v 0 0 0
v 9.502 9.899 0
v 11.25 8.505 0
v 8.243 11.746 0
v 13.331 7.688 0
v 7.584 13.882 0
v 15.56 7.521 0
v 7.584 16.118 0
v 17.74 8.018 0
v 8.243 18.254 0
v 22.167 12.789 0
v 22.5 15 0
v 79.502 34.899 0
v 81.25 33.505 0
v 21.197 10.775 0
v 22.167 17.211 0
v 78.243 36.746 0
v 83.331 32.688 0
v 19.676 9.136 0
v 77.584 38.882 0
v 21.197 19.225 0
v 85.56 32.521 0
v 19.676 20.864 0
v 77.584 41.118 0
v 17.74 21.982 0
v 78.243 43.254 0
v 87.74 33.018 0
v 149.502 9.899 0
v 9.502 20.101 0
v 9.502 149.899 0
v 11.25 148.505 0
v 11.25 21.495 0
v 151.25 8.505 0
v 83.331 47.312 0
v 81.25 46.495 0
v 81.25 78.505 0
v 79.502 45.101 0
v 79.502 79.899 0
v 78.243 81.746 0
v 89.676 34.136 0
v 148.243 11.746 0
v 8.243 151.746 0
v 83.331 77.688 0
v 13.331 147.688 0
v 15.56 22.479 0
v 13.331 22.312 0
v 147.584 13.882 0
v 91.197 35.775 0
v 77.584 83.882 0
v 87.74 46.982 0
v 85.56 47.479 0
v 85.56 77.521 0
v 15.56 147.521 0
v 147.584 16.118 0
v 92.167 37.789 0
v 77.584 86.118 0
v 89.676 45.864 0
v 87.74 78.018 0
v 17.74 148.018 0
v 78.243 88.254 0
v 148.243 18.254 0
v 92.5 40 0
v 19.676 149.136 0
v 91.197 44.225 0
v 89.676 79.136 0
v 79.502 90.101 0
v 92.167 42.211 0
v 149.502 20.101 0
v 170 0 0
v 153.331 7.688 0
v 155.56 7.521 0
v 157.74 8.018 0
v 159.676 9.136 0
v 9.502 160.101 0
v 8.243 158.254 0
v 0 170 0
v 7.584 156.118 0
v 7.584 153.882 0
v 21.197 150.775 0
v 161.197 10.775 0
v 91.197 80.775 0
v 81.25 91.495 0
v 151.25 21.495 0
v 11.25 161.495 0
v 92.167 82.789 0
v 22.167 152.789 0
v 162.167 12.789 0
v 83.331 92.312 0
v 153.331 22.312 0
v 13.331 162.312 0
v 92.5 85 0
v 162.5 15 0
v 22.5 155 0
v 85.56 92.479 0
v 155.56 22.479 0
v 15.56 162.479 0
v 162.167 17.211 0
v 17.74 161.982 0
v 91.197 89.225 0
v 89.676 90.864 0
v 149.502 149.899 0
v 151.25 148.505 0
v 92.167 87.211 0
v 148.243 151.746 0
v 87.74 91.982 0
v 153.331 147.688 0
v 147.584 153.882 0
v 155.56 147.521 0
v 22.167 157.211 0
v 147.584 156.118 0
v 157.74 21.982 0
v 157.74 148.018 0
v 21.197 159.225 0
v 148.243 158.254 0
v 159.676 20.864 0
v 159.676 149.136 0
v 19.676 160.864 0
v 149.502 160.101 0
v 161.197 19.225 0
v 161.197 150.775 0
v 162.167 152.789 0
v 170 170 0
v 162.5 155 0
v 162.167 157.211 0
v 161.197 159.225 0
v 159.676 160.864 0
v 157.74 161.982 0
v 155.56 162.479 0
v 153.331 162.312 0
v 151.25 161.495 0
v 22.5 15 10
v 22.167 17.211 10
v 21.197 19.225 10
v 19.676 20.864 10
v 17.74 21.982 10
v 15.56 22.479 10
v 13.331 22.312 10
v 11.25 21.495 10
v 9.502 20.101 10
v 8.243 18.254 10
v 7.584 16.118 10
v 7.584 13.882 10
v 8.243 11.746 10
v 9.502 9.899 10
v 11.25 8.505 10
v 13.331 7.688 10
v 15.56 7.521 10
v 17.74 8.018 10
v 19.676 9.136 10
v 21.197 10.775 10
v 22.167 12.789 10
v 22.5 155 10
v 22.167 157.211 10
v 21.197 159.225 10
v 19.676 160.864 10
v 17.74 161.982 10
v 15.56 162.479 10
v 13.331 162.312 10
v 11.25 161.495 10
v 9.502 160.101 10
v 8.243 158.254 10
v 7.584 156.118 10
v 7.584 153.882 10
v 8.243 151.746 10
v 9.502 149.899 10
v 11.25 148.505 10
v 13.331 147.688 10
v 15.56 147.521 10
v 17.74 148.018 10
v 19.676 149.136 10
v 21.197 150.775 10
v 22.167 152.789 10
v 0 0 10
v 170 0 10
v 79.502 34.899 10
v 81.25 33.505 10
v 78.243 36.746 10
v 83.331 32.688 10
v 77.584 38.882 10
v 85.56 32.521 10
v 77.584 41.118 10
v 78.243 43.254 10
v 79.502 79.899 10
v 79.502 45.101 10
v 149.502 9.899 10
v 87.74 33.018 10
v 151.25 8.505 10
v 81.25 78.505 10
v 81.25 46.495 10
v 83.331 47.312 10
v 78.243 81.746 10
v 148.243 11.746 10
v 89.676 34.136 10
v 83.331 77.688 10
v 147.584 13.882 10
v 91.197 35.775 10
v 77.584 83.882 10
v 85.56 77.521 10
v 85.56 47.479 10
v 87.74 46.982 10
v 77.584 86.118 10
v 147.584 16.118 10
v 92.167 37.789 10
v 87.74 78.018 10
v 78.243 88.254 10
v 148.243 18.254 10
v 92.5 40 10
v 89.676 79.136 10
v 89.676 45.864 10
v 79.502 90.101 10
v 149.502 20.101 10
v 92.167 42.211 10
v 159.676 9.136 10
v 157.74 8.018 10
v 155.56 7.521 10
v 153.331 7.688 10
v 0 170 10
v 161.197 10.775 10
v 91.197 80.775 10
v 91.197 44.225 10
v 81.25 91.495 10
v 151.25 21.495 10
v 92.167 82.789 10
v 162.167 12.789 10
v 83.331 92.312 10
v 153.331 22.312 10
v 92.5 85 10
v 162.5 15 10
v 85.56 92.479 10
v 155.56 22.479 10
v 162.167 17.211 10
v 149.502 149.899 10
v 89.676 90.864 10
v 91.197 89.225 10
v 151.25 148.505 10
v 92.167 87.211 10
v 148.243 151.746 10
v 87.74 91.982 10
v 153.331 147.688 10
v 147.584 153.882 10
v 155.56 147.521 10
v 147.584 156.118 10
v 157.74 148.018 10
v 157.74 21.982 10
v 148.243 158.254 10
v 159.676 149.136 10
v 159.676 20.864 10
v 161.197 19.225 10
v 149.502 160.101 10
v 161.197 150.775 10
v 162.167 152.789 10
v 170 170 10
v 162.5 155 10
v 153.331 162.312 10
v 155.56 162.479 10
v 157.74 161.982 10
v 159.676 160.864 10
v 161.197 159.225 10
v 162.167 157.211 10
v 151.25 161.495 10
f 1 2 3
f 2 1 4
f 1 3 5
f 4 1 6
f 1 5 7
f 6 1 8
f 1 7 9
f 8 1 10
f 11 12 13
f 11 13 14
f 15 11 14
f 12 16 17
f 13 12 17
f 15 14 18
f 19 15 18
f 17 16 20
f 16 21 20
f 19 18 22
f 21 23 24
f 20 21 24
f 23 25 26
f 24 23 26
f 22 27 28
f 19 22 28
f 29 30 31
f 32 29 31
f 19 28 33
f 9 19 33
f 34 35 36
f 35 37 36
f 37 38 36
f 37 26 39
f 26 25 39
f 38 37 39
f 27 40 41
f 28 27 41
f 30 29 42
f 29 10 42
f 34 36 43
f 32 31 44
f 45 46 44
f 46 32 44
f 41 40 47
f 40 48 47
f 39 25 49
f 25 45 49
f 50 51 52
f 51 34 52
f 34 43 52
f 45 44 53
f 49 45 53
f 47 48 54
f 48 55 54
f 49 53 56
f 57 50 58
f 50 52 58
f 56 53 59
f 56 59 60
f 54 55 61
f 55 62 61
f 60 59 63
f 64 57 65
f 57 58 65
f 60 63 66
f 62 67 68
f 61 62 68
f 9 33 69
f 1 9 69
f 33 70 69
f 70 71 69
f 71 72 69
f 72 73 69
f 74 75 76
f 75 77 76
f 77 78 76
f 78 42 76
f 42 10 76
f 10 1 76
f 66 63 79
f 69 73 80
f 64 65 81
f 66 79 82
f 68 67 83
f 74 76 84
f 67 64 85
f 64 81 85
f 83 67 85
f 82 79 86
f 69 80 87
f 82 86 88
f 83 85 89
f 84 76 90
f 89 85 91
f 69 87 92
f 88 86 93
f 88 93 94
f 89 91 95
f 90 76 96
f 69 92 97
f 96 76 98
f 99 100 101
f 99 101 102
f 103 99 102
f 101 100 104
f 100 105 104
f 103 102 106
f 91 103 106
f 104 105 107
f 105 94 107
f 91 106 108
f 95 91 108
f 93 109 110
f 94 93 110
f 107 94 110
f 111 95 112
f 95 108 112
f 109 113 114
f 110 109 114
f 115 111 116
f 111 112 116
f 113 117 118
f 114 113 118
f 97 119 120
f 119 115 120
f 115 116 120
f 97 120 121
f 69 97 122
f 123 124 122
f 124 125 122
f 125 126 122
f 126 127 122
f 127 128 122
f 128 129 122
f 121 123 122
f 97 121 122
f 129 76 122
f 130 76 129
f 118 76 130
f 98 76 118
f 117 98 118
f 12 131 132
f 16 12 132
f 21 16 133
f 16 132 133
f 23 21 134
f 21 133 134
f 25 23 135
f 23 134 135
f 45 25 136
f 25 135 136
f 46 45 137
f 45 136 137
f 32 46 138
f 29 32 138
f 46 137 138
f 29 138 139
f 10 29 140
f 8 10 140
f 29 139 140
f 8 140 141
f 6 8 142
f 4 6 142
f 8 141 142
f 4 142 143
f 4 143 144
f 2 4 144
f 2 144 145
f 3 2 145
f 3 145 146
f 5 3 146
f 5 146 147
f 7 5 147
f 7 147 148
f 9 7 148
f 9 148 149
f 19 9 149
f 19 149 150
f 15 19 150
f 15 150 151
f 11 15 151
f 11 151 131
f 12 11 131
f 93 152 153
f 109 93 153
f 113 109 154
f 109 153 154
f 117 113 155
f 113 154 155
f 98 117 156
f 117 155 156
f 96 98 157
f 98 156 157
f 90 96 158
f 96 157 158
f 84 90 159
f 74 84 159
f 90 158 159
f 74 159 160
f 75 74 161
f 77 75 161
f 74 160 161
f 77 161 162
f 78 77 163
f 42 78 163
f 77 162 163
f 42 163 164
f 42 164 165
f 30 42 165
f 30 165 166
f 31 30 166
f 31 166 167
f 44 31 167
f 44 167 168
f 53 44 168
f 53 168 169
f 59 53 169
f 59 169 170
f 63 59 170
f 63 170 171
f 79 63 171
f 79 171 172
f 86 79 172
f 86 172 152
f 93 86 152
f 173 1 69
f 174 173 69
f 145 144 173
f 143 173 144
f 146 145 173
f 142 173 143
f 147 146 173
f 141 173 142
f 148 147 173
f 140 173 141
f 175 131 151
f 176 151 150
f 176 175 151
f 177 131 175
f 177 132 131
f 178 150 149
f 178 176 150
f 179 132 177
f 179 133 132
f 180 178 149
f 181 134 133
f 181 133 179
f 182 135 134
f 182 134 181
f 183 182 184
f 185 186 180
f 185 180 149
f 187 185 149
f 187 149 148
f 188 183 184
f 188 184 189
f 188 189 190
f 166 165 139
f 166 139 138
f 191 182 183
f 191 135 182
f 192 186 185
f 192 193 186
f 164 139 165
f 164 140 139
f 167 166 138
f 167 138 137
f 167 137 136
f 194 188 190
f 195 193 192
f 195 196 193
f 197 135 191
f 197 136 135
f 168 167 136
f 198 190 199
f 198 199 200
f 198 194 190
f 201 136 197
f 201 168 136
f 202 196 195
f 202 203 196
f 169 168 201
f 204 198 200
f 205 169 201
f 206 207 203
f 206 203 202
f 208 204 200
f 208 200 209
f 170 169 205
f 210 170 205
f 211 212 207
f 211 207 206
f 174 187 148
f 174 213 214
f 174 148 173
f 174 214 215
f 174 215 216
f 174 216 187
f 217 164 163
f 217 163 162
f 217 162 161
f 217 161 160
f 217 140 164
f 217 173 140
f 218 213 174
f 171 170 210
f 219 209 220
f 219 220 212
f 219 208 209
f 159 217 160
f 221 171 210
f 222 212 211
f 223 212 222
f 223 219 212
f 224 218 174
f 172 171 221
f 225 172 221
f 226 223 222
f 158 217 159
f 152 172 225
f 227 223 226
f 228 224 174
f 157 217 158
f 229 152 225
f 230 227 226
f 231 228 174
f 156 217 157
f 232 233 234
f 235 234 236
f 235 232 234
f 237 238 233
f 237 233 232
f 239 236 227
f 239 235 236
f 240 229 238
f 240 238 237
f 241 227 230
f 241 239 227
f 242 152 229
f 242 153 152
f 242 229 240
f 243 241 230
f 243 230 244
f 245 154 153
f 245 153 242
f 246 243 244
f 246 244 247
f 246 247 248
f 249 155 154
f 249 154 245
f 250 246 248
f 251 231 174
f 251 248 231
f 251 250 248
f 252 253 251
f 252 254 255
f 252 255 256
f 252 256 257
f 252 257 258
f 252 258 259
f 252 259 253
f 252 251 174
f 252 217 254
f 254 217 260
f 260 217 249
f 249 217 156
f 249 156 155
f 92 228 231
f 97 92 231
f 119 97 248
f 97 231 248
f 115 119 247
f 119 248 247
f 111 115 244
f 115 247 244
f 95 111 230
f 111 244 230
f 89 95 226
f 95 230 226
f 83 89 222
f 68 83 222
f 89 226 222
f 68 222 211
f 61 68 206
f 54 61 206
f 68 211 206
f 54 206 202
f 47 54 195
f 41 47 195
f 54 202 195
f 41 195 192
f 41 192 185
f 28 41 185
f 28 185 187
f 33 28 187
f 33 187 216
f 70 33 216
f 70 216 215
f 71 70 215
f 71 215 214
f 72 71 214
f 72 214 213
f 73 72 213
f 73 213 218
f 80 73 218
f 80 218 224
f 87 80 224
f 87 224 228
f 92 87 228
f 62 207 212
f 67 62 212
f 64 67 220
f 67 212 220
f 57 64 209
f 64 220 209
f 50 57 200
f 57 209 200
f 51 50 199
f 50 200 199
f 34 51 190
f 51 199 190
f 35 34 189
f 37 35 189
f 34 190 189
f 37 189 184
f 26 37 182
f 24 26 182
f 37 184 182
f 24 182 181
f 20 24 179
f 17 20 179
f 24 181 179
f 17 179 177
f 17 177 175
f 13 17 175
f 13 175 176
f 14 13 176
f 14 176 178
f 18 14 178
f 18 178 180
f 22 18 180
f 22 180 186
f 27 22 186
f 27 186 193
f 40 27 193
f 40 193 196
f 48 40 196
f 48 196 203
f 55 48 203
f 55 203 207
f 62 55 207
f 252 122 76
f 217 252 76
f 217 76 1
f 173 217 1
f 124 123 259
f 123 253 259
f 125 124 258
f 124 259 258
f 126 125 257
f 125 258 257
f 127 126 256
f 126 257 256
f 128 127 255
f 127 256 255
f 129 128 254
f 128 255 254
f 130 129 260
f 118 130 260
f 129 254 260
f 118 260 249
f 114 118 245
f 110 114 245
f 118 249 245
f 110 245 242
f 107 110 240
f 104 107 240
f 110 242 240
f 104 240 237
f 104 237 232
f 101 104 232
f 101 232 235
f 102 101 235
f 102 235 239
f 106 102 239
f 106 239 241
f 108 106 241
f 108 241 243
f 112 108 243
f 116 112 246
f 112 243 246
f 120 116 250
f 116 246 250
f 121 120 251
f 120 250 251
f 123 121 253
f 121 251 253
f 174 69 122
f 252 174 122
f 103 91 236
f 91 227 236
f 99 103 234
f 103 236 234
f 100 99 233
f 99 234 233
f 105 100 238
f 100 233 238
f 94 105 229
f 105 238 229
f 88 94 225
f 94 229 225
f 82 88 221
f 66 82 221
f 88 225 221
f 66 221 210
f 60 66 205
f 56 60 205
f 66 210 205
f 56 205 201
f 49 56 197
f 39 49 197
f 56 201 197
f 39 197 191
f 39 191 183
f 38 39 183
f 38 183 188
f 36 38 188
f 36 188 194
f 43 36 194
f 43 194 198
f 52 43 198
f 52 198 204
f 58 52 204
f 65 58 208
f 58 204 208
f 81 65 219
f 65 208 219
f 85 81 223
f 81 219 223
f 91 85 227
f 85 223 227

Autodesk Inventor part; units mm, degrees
ref_plane "YZ Plane" through (0, 0, 0) normal (1, 0, 0) x (0, 1, 0)
ref_plane "XZ Plane" through (0, 0, 0) normal (0, 1, 0) x (-1, 0, 0)
ref_plane "XY Plane" through (0, 0, 0) normal (0, 0, 1) x (1, 0, 0)
sketch "Sketch1" plane through (0, 0, 0) normal (0, 0, 1) x (1, 0, 0)
  line L0 (0, 0) -> (170, 0)
  line L1 (170, 0) -> (170, 170)
  line L2 (170, 170) -> (0, 170)
  line L3 (0, 170) -> (0, 0)
  dimension "d0" = 170
  dimension "d1" = 170
extrude "Extrusion1" add sketch "Sketch1" along normal blind 10
sketch "Sketch2" plane through (0, 0, 10) normal (0, 0, 1) x (1, 0, 0)
  line L0 (170, 170) -> (0, 170) projected
  line L1 (0, 170) -> (0, 155)
  line L2 (0, 170) -> (0, 0) projected
  line L3 (0, 0) -> (170, 0) projected
  line L4 (0, 0) -> (0, 15)
  line L5 (0, 15) -> (155, 15)
  line L6 (155, 15) -> (155, 155)
  line L7 (155, 155) -> (15, 155)
  line L8 (15, 155) -> (15, 15)
  line L9 (15, 155) -> (30, 155)
  circle A0 centre (15, 155) radius 7.5
  circle A1 centre (155, 155) radius 7.5
  circle A2 centre (155, 15) radius 7.5
  circle A3 centre (15, 15) radius 7.5
  dimension "d4" = 15
  dimension "d5" = 15
  dimension "d6" = 155
  dimension "d7" = 140
  dimension "d8" = 140
  dimension "d9" = 140
  dimension "d10" = 15
  dimension "d11" = 15
  dimension "d12" = 15
  dimension "d13" = 15
extrude "Extrusion2" cut sketch "Sketch2" against normal blind 10 contours L8 A3 L5 | L5 A3 | L5 A3 L8 | A2 L6 L5 | L5 L6 A2 | A0 L7 L8 | L8 L7 A0 | A1 L7 L6 | L6 L7 A1
sketch "Sketch3" plane through (0, 0, 10) normal (0, 0, 1) x (1, 0, 0)
  line L0 (170, 170) -> (0, 170) projected
  line L1 (0, 170) -> (85, 170)
  line L2 (85, 170) -> (85, 85)
  circle A0 centre (85, 85) radius 7.5
  point P0 (0, 0)
  dimension "d16" = 85
  dimension "d17" = 85
  dimension "d18" = 15
extrude "Extrusion3" cut sketch "Sketch3" against normal blind 10
sketch "Sketch4" plane through (0, 0, 10) normal (0, 0, 1) x (1, 0, 0)
  line L0 (0, 0) -> (170, 0) projected
  line L1 (0, 0) -> (85, 0)
  line L2 (85, 0) -> (85, 40)
  circle A0 centre (85, 40) radius 7.5
  dimension "d21" = 85
  dimension "d22" = 40
  dimension "d23" = 15
extrude "Extrusion4" cut sketch "Sketch4" against normal blind 10
properties part number "AZ"
